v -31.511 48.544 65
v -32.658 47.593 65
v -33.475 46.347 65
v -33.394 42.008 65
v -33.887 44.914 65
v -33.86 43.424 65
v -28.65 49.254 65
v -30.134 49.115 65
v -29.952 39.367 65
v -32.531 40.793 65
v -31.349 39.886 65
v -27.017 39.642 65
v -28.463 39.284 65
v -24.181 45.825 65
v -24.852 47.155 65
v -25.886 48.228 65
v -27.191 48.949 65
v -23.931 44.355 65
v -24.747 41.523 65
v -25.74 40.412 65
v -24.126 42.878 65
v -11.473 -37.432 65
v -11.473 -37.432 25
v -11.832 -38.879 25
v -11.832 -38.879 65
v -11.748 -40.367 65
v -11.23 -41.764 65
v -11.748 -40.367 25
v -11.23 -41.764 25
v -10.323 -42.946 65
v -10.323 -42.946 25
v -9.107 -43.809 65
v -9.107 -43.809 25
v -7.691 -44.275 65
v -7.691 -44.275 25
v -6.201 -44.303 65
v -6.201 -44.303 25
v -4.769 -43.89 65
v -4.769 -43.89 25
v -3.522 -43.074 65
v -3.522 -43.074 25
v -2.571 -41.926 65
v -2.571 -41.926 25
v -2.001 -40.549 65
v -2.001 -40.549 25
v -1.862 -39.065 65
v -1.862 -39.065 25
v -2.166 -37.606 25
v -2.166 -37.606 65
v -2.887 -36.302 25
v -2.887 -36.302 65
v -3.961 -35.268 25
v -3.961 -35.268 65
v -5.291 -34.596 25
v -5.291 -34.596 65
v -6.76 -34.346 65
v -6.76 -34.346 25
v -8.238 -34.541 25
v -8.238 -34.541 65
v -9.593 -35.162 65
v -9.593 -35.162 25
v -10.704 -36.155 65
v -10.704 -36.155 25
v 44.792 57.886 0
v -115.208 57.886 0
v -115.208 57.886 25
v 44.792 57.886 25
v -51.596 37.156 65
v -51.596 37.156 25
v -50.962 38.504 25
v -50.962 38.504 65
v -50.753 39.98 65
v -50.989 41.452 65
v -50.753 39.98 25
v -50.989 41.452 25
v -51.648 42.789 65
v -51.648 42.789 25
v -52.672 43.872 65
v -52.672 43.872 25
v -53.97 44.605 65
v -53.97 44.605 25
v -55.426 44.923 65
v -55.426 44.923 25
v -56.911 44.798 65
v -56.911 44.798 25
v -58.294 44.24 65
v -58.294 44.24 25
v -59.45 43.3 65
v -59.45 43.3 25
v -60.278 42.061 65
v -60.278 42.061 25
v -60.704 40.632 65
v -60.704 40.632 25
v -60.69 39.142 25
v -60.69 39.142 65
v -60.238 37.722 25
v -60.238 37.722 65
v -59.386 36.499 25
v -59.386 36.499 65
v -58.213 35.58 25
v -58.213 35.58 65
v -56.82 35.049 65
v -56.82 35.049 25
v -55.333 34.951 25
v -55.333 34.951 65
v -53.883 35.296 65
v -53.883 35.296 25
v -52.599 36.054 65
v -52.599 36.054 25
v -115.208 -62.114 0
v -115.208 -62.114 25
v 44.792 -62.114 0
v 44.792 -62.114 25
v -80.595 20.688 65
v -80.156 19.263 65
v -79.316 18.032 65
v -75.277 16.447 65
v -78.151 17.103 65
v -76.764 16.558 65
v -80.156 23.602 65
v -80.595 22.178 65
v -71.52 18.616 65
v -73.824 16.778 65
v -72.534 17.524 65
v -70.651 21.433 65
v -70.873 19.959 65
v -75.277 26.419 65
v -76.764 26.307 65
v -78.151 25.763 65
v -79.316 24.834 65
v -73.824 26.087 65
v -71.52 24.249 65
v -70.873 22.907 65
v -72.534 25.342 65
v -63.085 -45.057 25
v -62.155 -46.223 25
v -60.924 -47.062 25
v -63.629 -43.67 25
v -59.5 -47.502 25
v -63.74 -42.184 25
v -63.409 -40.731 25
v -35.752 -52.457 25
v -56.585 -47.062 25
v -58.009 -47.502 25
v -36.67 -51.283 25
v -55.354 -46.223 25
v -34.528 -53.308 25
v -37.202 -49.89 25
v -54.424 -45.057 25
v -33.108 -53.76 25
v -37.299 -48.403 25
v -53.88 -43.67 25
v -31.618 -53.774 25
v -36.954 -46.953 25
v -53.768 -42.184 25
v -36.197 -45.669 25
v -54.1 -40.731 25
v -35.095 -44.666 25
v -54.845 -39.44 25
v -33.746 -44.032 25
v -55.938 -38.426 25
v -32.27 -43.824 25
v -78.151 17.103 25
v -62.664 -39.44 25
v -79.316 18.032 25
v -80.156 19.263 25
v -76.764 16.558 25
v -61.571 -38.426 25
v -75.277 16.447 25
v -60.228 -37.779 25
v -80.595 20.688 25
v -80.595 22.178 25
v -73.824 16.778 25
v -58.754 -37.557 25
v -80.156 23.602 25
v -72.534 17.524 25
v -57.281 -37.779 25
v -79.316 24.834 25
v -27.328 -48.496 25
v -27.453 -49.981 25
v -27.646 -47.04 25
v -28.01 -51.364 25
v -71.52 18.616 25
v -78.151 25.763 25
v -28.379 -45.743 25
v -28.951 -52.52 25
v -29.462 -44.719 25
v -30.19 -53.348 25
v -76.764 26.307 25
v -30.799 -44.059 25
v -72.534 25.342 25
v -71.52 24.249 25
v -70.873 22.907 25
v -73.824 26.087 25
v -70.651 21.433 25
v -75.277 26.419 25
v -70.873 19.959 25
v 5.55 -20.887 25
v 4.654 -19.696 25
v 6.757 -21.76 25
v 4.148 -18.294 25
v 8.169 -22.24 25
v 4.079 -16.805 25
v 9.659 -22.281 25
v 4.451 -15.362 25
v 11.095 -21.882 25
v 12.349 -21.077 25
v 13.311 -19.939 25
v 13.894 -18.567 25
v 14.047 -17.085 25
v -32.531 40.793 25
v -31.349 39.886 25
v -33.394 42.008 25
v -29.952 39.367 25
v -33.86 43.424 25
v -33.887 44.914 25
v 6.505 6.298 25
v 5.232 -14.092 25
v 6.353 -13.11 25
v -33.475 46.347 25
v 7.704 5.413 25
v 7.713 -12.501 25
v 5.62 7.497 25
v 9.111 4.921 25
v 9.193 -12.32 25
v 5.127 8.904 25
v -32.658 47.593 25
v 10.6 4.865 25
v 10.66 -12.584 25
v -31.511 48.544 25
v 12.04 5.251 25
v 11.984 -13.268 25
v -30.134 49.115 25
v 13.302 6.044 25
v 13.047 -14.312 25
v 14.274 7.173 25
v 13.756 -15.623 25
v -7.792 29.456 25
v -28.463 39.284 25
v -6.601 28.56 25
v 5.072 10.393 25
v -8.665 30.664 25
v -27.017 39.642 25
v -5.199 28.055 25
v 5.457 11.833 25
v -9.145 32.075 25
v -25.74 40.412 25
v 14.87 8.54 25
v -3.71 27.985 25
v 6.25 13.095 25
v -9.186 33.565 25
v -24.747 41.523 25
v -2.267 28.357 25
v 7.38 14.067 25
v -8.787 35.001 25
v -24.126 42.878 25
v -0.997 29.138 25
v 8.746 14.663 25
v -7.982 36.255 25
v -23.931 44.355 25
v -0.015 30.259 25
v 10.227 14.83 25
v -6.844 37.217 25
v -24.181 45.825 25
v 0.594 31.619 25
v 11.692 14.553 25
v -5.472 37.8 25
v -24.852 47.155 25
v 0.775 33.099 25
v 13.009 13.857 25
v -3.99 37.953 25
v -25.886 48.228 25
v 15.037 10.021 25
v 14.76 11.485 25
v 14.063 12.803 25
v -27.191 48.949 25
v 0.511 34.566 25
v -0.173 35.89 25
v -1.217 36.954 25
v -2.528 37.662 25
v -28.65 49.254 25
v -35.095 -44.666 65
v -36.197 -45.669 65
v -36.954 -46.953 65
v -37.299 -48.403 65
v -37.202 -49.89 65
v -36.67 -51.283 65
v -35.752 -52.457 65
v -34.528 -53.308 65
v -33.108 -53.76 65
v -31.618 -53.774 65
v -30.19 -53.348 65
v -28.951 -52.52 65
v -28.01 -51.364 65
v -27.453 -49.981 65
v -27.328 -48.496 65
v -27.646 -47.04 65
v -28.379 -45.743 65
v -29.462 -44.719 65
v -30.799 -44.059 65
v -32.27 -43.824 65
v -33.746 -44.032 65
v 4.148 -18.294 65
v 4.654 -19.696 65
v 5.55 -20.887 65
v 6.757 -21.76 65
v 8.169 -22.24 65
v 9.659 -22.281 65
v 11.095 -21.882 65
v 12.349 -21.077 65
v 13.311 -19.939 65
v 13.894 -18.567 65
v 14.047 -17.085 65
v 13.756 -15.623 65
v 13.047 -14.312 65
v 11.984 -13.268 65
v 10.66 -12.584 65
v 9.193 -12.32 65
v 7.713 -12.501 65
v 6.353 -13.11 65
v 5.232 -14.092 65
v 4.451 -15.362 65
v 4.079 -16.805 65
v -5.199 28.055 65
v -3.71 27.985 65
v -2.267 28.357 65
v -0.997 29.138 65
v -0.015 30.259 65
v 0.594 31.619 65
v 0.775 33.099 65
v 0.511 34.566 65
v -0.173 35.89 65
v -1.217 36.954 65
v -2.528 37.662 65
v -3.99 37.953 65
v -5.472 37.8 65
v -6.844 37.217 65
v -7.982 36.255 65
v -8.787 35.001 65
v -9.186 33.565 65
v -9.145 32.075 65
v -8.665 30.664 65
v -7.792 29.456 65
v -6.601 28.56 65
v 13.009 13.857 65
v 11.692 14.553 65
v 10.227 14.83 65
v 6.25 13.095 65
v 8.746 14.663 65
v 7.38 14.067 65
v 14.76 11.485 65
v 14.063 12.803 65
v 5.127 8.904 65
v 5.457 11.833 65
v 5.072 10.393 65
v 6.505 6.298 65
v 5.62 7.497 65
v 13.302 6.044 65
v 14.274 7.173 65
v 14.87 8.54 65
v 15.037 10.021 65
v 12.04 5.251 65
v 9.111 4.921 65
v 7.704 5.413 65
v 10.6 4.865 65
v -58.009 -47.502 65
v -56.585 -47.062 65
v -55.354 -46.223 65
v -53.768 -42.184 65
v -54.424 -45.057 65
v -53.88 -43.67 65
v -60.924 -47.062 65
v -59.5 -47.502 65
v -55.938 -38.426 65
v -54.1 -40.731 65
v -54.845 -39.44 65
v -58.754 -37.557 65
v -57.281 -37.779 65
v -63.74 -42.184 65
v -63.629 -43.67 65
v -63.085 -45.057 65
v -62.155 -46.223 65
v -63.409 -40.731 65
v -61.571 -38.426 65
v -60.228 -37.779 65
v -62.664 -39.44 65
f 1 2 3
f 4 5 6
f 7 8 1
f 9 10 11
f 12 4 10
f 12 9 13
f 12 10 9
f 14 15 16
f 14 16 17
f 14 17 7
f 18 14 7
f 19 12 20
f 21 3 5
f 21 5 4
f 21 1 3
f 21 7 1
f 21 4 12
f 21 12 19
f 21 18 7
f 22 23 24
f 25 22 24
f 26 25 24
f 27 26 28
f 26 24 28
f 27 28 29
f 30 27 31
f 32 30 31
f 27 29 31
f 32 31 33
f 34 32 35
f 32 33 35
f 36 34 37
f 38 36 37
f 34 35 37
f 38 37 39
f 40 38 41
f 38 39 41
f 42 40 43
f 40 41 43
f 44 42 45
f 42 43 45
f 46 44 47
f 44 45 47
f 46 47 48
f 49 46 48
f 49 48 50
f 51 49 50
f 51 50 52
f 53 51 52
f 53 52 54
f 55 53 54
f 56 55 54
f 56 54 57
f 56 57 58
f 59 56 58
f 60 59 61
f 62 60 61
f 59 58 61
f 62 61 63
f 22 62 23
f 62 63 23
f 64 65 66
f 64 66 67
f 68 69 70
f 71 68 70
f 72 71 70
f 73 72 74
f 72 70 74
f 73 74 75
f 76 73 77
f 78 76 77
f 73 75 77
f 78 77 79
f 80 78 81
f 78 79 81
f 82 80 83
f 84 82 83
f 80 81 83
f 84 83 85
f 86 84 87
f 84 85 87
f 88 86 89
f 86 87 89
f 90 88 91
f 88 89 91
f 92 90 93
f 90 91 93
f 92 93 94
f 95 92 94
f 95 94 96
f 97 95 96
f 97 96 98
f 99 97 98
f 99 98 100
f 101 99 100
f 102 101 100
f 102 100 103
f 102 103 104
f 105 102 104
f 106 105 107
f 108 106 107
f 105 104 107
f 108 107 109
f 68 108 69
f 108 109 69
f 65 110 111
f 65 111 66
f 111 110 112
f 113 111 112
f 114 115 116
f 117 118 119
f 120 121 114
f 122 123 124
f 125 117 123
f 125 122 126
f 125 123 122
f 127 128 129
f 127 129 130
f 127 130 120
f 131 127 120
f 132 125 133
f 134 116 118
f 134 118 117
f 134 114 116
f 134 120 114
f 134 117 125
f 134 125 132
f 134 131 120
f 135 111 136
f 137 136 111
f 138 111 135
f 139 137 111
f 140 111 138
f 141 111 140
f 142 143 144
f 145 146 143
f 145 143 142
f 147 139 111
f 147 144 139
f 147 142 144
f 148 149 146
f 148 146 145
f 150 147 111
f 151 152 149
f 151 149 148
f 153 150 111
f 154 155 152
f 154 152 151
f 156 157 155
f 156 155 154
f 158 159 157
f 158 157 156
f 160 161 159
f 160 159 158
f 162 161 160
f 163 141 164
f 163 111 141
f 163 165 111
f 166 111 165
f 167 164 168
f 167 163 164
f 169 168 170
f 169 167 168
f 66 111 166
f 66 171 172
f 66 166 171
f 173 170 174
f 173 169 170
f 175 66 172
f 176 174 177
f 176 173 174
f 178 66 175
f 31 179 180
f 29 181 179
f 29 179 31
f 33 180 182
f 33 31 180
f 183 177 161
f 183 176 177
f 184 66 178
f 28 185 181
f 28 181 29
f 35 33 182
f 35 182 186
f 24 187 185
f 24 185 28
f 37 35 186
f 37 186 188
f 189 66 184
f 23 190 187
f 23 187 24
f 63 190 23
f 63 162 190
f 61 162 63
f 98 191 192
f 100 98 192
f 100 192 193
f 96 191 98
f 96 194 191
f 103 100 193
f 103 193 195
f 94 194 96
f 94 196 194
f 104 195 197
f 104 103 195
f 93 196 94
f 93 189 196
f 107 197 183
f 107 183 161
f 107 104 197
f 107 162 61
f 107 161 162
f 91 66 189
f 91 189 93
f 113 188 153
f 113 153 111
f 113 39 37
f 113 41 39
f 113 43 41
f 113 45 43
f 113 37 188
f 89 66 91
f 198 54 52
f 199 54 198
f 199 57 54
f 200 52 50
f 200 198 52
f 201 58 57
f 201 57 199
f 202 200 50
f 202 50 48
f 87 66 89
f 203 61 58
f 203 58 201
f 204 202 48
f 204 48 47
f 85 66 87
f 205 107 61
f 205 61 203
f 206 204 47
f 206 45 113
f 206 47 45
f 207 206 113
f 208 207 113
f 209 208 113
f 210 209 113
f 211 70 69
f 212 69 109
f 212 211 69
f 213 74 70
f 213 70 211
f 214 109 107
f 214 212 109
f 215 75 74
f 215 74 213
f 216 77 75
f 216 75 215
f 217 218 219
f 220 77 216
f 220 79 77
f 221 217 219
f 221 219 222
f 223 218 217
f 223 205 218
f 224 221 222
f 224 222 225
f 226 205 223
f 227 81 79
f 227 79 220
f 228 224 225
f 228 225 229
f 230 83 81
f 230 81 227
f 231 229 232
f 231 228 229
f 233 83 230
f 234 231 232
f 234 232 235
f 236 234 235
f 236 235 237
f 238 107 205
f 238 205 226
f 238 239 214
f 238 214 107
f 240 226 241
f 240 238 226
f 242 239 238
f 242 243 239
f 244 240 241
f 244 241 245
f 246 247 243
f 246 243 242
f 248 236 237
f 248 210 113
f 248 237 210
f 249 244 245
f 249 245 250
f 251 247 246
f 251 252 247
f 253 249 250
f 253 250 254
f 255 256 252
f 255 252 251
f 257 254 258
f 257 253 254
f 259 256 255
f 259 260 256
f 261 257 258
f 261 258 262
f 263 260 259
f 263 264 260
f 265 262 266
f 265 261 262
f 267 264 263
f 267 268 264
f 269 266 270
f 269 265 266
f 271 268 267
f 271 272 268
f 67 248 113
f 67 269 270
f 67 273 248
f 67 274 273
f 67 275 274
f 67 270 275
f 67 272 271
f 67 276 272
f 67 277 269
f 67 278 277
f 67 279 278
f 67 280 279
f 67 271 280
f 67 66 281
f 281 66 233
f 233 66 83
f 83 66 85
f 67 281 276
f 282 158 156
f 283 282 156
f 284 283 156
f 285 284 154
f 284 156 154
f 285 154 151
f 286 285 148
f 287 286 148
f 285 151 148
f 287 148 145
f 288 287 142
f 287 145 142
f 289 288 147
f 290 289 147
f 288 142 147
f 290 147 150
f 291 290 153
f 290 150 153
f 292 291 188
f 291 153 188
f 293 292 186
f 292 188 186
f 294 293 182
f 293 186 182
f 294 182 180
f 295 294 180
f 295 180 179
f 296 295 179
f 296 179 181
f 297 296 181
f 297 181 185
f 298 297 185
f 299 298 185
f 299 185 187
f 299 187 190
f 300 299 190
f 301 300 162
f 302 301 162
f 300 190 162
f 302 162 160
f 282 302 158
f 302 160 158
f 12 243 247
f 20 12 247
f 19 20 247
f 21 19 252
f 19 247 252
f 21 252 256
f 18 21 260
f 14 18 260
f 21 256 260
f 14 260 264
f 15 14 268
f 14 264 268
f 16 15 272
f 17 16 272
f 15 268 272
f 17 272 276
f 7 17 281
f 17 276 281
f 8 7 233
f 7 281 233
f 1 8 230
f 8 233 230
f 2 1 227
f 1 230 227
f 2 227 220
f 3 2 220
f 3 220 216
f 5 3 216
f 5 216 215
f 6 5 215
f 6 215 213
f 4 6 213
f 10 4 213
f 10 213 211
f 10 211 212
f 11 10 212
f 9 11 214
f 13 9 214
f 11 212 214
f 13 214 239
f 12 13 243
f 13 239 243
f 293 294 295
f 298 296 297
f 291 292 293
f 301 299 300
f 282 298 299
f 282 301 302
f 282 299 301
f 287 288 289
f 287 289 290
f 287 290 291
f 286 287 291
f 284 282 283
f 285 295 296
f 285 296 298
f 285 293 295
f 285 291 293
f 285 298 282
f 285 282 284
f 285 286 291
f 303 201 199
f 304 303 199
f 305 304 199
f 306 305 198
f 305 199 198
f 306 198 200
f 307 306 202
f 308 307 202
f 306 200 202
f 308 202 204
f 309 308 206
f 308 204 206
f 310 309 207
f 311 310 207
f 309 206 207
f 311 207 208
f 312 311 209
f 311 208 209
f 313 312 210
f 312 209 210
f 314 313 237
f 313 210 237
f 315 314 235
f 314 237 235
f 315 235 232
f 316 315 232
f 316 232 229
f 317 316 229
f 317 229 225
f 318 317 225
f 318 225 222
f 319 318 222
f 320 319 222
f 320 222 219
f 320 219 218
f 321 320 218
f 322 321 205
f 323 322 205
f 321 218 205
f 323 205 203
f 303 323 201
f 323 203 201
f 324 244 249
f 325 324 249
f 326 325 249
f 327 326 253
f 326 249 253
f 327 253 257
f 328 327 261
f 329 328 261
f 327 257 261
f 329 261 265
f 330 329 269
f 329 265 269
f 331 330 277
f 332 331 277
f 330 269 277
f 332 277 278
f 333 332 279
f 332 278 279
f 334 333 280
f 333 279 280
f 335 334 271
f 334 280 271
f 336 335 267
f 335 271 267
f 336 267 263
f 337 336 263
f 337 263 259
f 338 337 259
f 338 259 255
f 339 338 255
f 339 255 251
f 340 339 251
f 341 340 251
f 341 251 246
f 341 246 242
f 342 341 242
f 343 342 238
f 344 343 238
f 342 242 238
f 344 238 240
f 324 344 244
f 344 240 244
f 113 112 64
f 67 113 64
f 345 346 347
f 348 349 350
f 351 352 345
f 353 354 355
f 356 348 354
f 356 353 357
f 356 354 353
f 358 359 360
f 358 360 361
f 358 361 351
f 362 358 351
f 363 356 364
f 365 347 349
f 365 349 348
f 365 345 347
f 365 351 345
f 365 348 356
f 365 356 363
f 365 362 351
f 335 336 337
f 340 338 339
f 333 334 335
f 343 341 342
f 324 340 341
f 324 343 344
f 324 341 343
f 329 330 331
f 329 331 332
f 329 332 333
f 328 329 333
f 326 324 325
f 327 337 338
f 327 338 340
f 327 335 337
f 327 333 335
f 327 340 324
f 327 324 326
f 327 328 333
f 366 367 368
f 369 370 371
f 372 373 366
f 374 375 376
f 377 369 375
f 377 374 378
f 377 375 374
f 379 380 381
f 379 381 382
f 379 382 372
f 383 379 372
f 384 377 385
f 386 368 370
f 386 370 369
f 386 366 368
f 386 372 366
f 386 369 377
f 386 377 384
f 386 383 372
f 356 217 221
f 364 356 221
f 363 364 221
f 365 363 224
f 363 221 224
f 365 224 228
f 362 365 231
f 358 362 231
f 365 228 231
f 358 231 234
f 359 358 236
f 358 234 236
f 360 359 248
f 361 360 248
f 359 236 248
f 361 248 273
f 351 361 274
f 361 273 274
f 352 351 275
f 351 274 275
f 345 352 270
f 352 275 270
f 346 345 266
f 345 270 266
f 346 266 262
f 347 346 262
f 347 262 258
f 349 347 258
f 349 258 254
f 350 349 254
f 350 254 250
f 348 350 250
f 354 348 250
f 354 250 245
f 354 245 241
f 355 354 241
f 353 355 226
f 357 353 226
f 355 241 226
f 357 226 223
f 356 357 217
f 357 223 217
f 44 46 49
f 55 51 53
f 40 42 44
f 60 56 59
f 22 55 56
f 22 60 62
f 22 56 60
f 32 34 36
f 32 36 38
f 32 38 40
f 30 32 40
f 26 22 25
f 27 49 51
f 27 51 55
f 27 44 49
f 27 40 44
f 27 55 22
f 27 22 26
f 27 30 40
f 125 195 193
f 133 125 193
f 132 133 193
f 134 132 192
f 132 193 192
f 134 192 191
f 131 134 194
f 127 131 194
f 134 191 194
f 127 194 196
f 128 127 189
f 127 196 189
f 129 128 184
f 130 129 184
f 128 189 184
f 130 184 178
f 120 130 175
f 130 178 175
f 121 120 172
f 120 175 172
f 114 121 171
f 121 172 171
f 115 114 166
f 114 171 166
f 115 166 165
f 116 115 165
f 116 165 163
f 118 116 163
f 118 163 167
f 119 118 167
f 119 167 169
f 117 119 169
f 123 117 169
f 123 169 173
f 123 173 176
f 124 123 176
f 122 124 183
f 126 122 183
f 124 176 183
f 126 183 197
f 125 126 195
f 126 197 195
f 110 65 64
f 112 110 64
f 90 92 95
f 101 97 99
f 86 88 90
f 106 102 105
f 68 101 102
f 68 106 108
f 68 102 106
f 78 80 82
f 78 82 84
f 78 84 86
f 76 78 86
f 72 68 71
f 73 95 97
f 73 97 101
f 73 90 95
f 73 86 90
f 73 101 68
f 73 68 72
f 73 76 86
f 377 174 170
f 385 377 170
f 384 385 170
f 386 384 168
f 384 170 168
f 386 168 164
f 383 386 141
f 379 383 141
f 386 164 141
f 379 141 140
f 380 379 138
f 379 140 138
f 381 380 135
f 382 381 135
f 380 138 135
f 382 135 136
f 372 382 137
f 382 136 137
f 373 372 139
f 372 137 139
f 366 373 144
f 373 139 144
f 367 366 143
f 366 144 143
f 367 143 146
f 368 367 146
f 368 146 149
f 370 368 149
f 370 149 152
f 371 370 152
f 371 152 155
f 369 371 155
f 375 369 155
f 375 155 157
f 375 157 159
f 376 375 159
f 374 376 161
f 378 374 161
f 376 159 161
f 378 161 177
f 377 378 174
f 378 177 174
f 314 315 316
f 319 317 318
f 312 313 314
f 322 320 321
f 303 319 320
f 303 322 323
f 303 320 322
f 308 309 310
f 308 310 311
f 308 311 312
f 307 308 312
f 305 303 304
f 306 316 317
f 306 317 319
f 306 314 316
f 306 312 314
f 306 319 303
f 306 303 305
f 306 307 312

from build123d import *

# Parameters (mm, degrees)
F0_W            = 160
F0_H            = 120
F1_DEPTH        = 25
F2_R            = 5
F4_DEPTH        = 40
F4_COPIES_COUNT = 9
F4_COPIES_ANGLE = 270


# Not quite as in the source:
# - a pattern or mirror of a feature is missing from the dataset's text; its kind, count and spacing are read off the source's solid


with BuildPart() as f1:
    # F0 (on Top) → F1 (new body)
    with BuildSketch(Plane.XY):
        with Locations((-35.207672789, -2.114020288)):
            Rectangle(F0_W, F0_H)
    extrude(amount=F1_DEPTH)

    # F2 (on face) → F4 (join)
    with BuildSketch(Plane.XY.offset(25)):
        with Locations((-75.6510049105, 21.4327722788)):
            Circle(F2_R)
    f4 = extrude(amount=F4_DEPTH)

    # F4_copies: F4 ×9 about axis
    f4_copies_axis = Axis((-35.207673, -2.11402, 0), (0, 0, -1))
    for i in range(1, F4_COPIES_COUNT):
        add(f4.rotate(f4_copies_axis, i * F4_COPIES_ANGLE / (F4_COPIES_COUNT - 1)))


solid = f1.part
